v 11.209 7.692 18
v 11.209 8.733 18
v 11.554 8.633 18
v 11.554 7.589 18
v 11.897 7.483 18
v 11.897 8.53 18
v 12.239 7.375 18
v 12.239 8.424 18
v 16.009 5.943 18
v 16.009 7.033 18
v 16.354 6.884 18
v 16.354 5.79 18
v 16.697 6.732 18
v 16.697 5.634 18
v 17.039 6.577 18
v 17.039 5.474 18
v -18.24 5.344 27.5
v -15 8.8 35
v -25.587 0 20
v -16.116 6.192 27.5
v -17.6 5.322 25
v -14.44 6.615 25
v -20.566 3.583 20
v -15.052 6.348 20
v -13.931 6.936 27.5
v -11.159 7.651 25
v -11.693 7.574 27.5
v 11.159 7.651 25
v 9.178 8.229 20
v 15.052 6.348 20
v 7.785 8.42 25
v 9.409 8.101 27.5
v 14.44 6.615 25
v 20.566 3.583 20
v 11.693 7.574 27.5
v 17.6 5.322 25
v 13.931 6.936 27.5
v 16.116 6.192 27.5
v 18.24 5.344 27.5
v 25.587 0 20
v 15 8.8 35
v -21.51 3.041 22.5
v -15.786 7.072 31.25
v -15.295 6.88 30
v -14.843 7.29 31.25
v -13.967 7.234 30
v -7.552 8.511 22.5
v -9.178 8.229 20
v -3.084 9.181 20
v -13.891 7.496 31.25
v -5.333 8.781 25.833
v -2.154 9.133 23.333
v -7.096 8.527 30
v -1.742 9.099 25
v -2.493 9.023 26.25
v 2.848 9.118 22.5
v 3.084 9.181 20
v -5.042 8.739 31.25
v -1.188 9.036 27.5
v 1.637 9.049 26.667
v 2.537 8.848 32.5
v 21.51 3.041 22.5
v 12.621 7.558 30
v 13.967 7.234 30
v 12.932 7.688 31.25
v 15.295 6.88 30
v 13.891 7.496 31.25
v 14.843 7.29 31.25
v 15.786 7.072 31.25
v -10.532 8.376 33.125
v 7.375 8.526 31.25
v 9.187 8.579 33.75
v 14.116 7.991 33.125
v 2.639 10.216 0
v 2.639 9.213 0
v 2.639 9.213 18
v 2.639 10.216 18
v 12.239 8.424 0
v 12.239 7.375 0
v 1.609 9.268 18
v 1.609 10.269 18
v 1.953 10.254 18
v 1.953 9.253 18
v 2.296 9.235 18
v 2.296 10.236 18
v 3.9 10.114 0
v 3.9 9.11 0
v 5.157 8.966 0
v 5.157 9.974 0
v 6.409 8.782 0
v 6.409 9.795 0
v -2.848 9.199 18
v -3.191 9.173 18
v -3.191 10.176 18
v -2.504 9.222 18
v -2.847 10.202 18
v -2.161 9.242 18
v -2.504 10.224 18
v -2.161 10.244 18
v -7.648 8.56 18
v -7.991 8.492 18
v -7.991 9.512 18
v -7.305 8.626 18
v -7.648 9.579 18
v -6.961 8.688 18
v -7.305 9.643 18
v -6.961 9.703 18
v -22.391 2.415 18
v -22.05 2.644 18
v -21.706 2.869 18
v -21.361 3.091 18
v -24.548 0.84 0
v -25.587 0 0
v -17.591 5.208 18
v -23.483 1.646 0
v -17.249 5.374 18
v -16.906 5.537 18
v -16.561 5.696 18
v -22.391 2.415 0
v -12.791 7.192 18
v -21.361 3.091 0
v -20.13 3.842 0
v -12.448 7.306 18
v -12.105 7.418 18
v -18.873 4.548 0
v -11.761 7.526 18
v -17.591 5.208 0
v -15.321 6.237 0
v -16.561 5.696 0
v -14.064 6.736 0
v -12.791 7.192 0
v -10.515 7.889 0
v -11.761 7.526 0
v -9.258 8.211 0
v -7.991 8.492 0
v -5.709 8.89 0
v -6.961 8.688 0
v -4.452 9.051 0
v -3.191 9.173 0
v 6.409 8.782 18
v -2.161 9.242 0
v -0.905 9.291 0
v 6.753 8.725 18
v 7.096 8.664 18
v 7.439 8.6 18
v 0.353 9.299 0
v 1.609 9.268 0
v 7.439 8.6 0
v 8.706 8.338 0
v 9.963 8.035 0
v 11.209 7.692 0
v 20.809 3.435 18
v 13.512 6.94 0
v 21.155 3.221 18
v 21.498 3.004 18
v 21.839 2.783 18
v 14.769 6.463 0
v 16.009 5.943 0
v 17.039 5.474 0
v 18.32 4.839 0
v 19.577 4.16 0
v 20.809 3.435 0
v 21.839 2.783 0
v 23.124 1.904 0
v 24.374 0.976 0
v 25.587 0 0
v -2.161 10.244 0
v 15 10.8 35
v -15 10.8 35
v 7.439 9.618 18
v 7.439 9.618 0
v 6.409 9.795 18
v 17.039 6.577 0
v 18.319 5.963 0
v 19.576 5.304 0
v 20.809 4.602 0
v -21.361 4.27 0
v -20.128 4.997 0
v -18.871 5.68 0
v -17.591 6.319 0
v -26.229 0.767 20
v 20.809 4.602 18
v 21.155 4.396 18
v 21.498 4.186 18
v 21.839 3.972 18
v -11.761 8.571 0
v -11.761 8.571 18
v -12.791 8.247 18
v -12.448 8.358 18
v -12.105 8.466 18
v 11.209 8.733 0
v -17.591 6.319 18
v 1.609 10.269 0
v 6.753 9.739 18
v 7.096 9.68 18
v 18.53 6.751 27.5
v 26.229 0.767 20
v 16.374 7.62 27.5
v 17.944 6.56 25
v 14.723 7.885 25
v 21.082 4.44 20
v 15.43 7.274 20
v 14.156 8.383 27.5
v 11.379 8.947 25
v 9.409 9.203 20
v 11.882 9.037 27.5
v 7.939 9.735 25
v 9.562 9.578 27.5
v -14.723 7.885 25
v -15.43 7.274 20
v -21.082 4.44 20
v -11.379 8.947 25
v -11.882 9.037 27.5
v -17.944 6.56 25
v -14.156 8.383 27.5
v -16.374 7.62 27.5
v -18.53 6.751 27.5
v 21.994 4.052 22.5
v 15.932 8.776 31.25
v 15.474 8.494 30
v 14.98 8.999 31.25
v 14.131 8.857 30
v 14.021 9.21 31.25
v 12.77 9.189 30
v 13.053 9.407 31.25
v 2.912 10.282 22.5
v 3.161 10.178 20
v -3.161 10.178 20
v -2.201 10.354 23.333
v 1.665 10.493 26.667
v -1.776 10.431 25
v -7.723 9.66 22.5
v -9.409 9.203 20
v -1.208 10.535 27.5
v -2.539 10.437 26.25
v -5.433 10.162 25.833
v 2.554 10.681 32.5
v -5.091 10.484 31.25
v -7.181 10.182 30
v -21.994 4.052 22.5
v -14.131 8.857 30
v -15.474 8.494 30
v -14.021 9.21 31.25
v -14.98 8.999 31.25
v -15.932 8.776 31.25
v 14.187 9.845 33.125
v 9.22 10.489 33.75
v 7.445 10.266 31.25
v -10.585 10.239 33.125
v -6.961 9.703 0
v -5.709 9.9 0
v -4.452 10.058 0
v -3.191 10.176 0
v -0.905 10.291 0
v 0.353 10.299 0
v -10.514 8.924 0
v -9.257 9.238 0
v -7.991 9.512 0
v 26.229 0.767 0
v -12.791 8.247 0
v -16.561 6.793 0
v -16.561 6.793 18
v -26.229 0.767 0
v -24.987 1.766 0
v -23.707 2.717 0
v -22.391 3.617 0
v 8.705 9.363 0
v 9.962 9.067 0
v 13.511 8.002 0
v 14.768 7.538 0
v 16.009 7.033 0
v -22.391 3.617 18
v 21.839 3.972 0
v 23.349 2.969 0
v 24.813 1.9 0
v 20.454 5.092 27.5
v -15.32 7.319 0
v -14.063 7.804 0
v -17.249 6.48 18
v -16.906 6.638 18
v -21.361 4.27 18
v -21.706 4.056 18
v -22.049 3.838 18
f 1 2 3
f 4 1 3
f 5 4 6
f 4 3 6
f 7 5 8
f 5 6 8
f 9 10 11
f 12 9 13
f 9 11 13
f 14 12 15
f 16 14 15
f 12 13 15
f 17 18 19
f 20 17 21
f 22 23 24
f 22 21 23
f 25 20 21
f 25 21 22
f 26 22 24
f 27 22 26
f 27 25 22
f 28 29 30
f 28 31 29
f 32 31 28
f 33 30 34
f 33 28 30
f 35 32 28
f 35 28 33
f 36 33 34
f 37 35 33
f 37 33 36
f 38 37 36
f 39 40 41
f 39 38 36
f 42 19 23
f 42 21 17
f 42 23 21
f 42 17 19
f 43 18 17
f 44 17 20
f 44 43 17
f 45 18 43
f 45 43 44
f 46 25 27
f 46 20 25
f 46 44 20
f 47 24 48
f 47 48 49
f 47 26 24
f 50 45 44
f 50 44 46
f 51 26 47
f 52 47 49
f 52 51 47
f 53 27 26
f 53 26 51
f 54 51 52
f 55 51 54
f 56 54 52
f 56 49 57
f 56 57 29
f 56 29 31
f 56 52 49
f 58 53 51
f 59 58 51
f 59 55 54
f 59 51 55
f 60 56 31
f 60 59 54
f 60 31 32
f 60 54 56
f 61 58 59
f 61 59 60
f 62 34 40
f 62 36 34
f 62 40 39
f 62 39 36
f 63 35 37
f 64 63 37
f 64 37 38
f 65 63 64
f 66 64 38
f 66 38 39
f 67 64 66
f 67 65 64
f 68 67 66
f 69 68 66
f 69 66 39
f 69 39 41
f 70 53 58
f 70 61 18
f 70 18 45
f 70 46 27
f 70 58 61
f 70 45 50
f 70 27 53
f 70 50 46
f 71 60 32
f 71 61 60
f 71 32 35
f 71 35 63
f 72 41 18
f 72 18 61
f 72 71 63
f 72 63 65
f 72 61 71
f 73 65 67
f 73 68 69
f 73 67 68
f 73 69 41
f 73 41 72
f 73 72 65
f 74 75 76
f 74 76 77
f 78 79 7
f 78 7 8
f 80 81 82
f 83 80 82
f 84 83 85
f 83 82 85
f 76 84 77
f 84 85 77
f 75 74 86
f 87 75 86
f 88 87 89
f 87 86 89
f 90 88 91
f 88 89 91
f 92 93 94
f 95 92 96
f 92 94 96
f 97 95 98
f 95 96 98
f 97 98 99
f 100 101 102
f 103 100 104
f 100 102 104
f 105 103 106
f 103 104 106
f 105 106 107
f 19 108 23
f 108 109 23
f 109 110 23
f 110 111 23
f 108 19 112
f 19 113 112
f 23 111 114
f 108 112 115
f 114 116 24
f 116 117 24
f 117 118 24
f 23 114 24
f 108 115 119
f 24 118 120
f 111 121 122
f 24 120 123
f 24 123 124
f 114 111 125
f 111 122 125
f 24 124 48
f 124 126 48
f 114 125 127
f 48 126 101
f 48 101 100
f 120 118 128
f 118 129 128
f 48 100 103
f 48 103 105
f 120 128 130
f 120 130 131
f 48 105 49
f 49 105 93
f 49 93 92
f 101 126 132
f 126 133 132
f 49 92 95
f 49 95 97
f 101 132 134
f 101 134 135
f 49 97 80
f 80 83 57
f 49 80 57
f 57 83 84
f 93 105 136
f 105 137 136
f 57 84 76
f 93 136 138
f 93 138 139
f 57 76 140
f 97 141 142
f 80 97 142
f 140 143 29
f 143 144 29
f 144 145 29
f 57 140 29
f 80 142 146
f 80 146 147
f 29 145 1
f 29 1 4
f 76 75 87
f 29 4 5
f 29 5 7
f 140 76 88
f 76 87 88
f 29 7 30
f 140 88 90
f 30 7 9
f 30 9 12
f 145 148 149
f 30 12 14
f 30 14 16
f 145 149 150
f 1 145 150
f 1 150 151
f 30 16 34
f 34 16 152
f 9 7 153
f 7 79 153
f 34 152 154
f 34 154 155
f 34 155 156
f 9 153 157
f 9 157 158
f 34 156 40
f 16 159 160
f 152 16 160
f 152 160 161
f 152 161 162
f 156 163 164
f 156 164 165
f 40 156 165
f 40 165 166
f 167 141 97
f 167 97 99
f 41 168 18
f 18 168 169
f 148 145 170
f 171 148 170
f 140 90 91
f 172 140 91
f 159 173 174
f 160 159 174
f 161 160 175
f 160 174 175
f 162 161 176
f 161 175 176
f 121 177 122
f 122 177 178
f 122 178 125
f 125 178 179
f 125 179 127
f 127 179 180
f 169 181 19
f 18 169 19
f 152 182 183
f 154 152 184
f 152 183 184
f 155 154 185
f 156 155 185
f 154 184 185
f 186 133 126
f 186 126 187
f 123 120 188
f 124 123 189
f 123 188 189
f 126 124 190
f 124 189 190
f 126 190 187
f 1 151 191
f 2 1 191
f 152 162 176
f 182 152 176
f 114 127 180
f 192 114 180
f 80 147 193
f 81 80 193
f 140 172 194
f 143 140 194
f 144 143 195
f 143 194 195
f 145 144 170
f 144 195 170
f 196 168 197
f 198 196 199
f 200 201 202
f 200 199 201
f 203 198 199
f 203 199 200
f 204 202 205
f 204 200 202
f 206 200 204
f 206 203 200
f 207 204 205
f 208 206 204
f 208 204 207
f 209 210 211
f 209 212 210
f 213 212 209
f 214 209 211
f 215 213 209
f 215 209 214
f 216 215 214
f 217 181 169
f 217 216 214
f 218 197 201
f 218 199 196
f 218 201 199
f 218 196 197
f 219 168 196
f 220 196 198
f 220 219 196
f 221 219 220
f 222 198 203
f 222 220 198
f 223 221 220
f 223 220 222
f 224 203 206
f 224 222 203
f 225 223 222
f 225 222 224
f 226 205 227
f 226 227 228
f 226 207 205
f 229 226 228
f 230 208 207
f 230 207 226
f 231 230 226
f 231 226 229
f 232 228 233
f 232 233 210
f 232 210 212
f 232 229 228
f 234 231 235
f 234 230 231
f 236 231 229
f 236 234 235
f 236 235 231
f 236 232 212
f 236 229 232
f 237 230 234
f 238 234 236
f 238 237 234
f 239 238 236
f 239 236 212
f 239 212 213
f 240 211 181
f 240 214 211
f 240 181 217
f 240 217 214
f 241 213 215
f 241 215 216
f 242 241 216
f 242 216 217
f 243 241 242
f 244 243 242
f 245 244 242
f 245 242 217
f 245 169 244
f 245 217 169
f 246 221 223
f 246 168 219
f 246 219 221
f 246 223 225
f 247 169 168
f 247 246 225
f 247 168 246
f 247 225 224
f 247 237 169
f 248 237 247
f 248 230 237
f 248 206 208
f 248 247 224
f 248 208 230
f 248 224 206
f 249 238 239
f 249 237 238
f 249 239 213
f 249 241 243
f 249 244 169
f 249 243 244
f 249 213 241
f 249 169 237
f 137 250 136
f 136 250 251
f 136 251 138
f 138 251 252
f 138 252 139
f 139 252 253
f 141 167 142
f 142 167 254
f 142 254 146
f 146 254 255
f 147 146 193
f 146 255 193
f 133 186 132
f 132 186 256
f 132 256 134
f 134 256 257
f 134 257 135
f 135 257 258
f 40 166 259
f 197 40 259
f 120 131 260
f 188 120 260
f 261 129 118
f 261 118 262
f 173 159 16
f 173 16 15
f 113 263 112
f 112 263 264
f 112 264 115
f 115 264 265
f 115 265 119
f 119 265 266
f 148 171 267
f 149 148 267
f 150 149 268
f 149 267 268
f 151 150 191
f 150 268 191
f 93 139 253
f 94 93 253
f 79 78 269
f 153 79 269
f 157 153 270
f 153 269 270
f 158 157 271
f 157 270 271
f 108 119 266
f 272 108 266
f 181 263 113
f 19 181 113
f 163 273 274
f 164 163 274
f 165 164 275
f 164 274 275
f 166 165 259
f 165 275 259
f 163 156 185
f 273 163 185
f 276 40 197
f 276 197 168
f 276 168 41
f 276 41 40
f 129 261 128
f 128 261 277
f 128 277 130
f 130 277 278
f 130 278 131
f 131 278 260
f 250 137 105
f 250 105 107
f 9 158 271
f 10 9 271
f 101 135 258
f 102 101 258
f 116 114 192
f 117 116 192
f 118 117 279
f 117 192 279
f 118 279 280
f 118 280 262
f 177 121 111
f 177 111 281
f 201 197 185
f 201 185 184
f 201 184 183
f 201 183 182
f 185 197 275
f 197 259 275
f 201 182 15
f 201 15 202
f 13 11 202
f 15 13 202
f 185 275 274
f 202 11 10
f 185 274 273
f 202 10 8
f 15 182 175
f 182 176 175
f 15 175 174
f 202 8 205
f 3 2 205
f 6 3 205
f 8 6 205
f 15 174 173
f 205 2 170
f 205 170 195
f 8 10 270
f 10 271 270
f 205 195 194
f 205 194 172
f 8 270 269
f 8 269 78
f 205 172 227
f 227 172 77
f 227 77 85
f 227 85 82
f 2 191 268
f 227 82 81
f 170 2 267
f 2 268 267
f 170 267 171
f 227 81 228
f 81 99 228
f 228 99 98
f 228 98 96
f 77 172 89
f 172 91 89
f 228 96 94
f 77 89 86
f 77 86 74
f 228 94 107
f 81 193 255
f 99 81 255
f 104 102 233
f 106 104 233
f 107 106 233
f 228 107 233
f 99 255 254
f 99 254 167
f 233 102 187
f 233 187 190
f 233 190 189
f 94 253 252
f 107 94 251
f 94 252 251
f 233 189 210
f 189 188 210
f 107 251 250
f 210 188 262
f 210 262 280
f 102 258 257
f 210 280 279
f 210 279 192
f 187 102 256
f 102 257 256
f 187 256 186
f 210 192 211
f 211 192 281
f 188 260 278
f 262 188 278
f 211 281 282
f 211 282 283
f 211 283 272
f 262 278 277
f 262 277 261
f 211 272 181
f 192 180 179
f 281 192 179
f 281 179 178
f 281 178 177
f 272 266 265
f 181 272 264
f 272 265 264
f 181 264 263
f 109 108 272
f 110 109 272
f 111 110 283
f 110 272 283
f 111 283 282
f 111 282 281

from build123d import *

# Parameters (mm, degrees)
F1_DEPTH = 20
F2_W     = 1.029727
F2_H     = 13.097165
F3_DEPTH = 18
F5_W     = 30
F5_H     = 2


with BuildPart() as f1:
    # F0 (on Top) → F1 (new body)
    with BuildSketch(Plane.XY):
        with BuildLine():
            ThreePointArc((-25.586572, 0), (0, 9.300989), (25.586572, 0))
            Line((25.586572, 0), (26.228737, 0.766566))
            ThreePointArc((26.228737, 0.766566), (0, 10.300989), (-26.228737, 0.766566))
            Line((-26.228737, 0.766566), (-25.586572, 0))
        make_face()
    extrude(amount=F1_DEPTH)

    # F2 (on Top) → F3 (cut)
    with BuildSketch(Plane.XY):
        with Locations((-21.875679, 6.548582)):
            Rectangle(F2_W, F2_H)
        with Locations((-17.075679, 6.548582)):
            Rectangle(F2_W, F2_H)
        with Locations((-12.275679, 6.548582)):
            Rectangle(F2_W, F2_H)
        with Locations((-7.47568, 6.548582)):
            Rectangle(F2_W, F2_H)
        with Locations((-2.67568, 6.548582)):
            Rectangle(F2_W, F2_H)
        with Locations((2.12432, 6.548582)):
            Rectangle(F2_W, F2_H)
        with Locations((6.924321, 6.548582)):
            Rectangle(F2_W, F2_H)
        with Locations((11.72432, 6.548582)):
            Rectangle(F2_W, F2_H)
        with Locations((16.52432, 6.548582)):
            Rectangle(F2_W, F2_H)
        with Locations((21.32432, 6.548582)):
            Rectangle(F2_W, F2_H)
    extrude(amount=F3_DEPTH, mode=Mode.SUBTRACT)

    # F1_face (on face) → F6 section 0
    with BuildSketch(Plane(origin=(0, 6.611875, 20), x_dir=(1, 0, 0), z_dir=(0, 0, 1))):
        with BuildLine():
            Line((25.586572, -6.611875), (26.228737, -5.845309))
            ThreePointArc((26.228737, -5.845309), (0, 3.689114), (-26.228737, -5.845309))
            Line((-26.228737, -5.845309), (-25.586572, -6.611875))
            ThreePointArc((-25.586572, -6.611875), (0, 2.689114), (25.586572, -6.611875))
        make_face()
    # F5 (on offset) → F6 section 1
    with BuildSketch(Plane.XY.offset(35)):
        with Locations((0, 9.8)):
            Rectangle(F5_W, F5_H)
    loft()


solid = f1.part
